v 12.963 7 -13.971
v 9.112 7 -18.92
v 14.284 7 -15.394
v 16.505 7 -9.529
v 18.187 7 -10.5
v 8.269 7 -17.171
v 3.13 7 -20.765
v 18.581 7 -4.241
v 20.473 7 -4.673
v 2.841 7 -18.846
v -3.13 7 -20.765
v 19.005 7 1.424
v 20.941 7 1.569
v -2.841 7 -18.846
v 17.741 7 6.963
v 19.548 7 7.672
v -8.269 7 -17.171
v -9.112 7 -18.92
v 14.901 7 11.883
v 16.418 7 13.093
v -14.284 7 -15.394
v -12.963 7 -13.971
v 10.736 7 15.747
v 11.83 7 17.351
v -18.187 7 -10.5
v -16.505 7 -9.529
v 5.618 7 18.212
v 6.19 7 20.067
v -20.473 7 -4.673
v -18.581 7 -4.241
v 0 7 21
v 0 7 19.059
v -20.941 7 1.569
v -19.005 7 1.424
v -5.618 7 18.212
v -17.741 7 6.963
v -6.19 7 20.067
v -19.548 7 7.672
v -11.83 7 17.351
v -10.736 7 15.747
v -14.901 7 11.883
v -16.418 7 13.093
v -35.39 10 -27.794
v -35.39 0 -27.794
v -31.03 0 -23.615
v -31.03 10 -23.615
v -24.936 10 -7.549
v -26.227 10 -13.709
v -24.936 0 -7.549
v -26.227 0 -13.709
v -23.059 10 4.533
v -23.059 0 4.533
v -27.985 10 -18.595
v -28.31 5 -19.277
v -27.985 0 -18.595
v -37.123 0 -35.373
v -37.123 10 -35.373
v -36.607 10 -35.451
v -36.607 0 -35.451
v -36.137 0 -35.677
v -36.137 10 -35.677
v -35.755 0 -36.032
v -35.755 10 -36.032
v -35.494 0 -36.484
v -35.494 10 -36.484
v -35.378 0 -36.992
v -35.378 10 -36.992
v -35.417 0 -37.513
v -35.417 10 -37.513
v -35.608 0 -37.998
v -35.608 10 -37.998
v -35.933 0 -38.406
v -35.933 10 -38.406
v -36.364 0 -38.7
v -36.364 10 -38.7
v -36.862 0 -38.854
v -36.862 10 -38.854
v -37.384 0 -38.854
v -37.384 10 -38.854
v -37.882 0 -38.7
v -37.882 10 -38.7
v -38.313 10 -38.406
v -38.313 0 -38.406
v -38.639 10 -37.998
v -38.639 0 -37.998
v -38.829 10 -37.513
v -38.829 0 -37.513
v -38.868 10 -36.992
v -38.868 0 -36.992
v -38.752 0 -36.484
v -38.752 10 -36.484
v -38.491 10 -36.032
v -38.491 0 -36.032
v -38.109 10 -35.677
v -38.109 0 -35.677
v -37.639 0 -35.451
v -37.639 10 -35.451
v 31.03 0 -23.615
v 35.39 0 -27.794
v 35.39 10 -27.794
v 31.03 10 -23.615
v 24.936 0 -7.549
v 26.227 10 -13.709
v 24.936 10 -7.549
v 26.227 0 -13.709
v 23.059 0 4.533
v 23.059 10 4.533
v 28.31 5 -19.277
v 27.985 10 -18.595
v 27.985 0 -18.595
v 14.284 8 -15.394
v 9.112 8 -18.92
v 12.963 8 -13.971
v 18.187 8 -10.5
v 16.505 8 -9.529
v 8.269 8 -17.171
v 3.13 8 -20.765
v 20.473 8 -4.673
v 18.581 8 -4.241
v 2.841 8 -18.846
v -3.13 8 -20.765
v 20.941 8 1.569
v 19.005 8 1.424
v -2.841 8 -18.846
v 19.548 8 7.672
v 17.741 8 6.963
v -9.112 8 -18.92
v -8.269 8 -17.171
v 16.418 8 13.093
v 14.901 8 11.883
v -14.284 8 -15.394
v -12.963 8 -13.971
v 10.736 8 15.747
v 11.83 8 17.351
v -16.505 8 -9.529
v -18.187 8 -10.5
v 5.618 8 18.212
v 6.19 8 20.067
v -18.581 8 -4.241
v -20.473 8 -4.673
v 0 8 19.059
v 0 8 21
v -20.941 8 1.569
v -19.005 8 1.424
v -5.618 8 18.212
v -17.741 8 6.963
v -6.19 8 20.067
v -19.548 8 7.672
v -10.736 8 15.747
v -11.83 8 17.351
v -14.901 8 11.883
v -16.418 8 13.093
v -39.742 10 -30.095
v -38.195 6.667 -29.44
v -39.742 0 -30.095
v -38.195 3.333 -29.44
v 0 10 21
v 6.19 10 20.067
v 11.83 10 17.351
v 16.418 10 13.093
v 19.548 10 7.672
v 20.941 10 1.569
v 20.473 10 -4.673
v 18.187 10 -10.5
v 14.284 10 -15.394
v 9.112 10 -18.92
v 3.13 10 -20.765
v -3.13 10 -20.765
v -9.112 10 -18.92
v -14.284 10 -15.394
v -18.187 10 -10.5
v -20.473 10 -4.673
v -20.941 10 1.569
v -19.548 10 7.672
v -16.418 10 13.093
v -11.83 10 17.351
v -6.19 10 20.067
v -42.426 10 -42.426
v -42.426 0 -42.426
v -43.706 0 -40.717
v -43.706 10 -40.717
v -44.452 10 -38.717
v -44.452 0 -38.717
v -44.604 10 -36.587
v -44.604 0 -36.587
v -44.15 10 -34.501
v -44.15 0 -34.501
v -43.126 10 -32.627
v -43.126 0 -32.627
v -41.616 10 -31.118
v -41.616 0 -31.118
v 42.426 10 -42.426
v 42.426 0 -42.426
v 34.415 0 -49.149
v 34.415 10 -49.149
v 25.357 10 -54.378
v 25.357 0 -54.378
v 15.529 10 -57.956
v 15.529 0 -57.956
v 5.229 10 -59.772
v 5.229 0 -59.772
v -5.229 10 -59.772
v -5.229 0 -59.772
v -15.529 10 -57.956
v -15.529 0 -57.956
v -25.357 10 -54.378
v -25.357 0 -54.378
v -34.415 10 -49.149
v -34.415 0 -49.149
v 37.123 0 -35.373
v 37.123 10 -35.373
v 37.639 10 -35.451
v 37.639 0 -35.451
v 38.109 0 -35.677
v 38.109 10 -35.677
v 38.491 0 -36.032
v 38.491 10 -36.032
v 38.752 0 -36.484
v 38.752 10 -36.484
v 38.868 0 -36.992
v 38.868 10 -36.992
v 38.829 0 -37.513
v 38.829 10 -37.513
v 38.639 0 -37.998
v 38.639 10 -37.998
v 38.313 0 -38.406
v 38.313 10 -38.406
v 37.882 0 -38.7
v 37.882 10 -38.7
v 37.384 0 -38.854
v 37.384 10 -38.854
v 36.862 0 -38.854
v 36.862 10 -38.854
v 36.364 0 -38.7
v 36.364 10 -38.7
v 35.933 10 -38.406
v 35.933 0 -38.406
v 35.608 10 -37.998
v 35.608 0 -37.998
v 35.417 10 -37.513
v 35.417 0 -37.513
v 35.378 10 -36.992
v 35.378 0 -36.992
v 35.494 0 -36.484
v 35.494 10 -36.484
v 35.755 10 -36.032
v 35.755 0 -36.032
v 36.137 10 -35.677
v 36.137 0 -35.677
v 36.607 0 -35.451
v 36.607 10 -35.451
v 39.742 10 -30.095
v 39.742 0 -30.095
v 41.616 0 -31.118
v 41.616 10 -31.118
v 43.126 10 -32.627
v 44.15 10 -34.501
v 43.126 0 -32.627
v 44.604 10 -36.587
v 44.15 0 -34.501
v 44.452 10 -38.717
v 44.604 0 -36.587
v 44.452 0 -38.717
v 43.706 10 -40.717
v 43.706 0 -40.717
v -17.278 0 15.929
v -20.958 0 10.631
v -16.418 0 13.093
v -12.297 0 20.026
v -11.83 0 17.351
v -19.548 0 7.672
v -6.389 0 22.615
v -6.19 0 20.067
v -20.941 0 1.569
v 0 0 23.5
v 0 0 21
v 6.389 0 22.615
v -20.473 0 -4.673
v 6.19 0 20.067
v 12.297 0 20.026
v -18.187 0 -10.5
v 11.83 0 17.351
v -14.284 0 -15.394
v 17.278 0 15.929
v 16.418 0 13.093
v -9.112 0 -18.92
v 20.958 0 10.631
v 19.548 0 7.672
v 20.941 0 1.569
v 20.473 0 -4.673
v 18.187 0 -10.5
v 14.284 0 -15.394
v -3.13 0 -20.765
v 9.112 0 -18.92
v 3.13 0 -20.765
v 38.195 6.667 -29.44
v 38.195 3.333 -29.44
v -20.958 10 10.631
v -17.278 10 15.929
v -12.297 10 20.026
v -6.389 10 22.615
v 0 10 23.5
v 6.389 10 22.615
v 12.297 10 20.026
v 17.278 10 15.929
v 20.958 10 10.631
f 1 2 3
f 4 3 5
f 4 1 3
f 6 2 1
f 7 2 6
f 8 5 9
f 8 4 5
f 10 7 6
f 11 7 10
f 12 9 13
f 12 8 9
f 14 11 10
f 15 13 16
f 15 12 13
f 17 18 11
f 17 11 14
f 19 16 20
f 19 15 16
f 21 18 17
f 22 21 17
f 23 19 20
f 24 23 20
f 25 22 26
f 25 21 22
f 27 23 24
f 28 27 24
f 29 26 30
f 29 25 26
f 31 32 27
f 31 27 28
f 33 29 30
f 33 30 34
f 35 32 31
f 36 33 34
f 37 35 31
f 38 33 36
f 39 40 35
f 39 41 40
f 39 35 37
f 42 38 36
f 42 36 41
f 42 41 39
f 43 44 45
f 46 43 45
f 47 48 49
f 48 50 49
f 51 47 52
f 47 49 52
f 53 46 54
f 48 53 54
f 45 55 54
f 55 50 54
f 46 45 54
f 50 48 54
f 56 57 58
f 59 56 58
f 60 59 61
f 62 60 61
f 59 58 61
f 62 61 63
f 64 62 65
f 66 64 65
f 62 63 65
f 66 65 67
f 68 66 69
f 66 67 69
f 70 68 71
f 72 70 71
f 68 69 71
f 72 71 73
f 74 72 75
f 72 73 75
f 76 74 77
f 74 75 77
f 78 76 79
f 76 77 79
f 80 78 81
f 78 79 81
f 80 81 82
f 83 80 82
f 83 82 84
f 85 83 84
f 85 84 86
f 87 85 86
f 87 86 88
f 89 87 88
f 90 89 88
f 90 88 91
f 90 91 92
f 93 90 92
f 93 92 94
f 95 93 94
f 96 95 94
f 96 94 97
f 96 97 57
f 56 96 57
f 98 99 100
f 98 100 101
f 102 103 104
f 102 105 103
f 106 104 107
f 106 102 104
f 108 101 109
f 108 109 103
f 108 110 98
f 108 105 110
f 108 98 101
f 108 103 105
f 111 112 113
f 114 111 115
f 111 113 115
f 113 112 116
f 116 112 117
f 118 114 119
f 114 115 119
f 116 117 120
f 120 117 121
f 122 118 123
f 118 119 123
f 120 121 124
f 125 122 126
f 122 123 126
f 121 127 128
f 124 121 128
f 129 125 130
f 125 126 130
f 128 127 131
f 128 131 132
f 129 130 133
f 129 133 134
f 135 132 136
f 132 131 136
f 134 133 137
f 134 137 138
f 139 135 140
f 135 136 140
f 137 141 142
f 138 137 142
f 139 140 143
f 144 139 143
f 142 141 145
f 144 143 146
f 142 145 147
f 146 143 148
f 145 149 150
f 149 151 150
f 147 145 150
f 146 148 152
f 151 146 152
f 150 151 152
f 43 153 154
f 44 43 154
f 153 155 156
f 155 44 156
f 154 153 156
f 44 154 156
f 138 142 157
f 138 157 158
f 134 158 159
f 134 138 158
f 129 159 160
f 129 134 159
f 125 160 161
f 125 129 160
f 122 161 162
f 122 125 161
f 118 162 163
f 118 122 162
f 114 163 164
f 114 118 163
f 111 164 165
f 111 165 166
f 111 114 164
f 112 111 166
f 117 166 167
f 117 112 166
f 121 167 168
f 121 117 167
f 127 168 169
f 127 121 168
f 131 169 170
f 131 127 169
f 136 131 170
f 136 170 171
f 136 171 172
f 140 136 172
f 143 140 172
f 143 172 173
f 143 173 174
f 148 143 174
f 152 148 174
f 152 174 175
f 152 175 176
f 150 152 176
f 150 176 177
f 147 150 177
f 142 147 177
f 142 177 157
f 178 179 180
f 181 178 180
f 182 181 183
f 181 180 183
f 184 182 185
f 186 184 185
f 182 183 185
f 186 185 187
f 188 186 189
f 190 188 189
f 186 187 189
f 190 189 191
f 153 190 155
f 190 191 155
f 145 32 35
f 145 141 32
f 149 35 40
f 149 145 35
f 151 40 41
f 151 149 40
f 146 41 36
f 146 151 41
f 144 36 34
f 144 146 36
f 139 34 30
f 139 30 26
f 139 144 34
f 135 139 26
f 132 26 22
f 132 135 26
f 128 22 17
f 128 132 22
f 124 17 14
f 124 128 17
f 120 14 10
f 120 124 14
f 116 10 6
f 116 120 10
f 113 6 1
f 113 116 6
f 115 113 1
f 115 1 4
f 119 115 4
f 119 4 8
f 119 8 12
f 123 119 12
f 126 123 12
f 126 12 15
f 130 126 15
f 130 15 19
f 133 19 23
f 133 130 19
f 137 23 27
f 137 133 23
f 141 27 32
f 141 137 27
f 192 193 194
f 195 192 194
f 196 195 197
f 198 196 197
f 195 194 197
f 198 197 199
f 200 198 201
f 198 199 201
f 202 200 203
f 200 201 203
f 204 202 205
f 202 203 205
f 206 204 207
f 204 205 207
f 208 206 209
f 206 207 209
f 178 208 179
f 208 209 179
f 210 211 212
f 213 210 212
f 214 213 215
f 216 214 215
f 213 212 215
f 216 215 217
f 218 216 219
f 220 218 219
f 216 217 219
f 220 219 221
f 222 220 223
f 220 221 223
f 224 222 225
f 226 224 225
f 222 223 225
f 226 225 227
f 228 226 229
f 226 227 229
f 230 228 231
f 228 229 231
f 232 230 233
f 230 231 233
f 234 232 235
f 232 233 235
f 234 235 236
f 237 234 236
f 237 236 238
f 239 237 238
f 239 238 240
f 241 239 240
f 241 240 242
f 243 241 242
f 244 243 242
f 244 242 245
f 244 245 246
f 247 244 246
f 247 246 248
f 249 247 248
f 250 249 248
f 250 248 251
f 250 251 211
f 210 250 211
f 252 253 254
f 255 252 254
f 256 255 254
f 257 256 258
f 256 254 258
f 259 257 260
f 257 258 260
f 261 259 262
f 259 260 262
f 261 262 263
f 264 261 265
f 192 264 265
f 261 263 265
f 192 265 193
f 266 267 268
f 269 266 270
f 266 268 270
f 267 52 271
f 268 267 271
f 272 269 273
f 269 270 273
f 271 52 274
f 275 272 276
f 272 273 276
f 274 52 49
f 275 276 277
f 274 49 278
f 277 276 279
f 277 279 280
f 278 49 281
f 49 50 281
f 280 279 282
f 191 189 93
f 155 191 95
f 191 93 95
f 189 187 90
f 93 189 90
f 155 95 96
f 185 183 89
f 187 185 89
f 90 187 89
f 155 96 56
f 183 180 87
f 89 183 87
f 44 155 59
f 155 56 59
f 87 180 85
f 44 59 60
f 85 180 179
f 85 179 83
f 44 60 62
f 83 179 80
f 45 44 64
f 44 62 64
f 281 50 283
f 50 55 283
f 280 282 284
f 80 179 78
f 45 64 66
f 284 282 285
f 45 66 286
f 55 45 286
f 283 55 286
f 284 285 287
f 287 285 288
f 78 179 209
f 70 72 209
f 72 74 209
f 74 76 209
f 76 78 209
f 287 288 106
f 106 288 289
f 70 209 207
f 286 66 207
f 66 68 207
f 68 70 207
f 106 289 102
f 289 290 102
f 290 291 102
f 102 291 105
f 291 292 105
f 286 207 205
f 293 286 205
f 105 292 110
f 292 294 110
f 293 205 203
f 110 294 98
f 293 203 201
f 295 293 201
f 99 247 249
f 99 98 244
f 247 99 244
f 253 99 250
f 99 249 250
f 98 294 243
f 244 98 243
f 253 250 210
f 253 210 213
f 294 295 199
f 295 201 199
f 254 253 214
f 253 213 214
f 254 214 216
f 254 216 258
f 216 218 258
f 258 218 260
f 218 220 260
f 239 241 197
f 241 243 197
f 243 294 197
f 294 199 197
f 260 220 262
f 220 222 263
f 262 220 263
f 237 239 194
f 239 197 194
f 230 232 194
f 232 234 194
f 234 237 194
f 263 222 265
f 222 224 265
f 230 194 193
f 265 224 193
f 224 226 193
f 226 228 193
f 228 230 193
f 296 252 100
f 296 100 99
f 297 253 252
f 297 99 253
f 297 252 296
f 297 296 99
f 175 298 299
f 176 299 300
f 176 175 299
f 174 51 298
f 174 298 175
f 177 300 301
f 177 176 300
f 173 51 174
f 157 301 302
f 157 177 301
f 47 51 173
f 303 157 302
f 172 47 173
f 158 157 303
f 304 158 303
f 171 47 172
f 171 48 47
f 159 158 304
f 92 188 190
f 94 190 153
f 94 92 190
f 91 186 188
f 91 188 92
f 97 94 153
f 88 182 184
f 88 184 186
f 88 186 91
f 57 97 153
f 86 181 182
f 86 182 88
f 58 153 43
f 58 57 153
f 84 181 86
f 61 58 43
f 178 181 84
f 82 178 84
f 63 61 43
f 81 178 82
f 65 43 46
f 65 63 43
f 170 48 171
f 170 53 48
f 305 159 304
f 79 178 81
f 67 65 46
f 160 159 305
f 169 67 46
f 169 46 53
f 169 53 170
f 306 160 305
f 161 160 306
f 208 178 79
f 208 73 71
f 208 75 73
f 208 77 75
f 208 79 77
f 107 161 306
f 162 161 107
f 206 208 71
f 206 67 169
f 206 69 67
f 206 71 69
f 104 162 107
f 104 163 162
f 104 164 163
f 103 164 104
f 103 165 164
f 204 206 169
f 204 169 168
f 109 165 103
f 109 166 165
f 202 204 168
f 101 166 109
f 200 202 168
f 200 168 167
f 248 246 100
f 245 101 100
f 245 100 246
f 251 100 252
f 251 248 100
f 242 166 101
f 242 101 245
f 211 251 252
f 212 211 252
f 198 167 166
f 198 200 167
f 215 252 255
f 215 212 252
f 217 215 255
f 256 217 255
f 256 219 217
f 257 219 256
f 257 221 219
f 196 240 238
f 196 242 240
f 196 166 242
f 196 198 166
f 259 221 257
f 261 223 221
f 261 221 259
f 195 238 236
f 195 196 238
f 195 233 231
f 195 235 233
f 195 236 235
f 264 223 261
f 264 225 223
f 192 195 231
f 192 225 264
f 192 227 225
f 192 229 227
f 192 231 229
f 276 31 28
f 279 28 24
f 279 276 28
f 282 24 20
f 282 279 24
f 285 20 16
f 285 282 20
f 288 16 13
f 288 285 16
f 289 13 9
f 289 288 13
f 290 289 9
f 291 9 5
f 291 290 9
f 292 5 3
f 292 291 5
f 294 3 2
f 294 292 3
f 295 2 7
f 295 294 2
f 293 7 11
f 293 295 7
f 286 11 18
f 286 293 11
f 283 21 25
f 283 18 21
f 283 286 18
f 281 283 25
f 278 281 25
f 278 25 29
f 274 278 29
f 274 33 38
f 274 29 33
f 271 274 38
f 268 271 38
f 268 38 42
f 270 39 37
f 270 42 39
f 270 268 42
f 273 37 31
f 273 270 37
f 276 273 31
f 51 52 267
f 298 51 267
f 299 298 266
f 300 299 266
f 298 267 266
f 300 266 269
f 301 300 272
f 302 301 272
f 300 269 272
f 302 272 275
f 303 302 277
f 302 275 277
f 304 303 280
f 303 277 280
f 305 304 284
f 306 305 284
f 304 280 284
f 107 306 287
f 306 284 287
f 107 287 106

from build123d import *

# Parameters (mm, degrees)
SKETCH2_R           = 21
BOSS_EXTRUDE1_DEPTH = 10
CUT_EXTRUDE1_REACH  = 77.44
SKETCH3_R           = 1.75
SKETCH5_W           = 4
SKETCH5_H           = 1


with BuildPart() as part:
    # Sketch2 → Boss-Extrude1 (new body)
    # profile 1 of 6: a face of its own
    with BuildSketch(Plane(origin=(0, 0, 0), x_dir=(1, 0, 0), z_dir=(0, 1, 0))):
        with BuildLine():
            ThreePointArc((-39.742001703, 30.095205518), (-35.527778851, 29.794741171), (-31.819805153, 31.819805153))
            Line((-31.819805153, 31.819805153), (-42.426406871, 42.426406871))
            ThreePointArc((-42.426406871, 42.426406871), (-44.451470854, 35.527778851), (-39.742001703, 30.095205518))
        make_face()
    # profile 2 of 6: a face of its own
    with BuildSketch(Plane(origin=(0, 0, 0), x_dir=(1, 0, 0), z_dir=(0, 1, 0))):
        with BuildLine():
            Line((-42.426406871, 42.426406871), (-31.819805153, 31.819805153))
            ThreePointArc((-31.819805153, 31.819805153), (0, 45), (31.819805153, 31.819805153))
            ThreePointArc((31.819805153, 31.819805153), (35.527778851, 29.794741171), (39.742001703, 30.095205518))
            ThreePointArc((39.742001703, 30.095205518), (44.451470854, 35.527778851), (42.426406871, 42.426406871))
            ThreePointArc((42.426406871, 42.426406871), (0, 60), (-42.426406871, 42.426406871))
        make_face()
    # profile 3 of 6: a face of its own
    with BuildSketch(Plane(origin=(0, 0, 0), x_dir=(1, 0, 0), z_dir=(0, 1, 0))):
        with BuildLine():
            ThreePointArc((31.819805153, 31.819805153), (0, 45), (-31.819805153, 31.819805153))
            ThreePointArc((-31.819805153, 31.819805153), (-33.665365801, 29.860394262), (-35.390472848, 27.794143836))
            add(Edge.make_bspline(
                [(-35.390472848, 27.794143836), (-32.245912853, 25.570807212), (-24.806129807, 15.839794796), (-24.750821328, 4.074395815), (-23.058627279, -4.533178579)],
                knots=[0.115209689, 0.115209689, 0.115209689, 0.115209689, 0.392292763, 1, 1, 1, 1], degree=3))
            ThreePointArc((-23.058627279, -4.533178579), (-2.277307506, 23.38939654), (23.5, 0))
            ThreePointArc((23.5, 0), (23.38939654, -2.277307506), (23.058627279, -4.533178579))
            add(Edge.make_bspline(
                [(35.390472848, 27.794143836), (32.245912853, 25.570807212), (24.806129807, 15.839794796), (24.750821328, 4.074395815), (23.058627279, -4.533178579)],
                knots=[0.115209689, 0.115209689, 0.115209689, 0.115209689, 0.392292763, 1, 1, 1, 1], degree=3))
            ThreePointArc((35.390472848, 27.794143836), (33.665365801, 29.860394262), (31.819805153, 31.819805153))
        make_face()
    # profile 4 of 6: a face of its own
    with BuildSketch(Plane(origin=(0, 0, 0), x_dir=(1, 0, 0), z_dir=(0, 1, 0))):
        with BuildLine():
            ThreePointArc((-35.390472848, 27.794143836), (-33.665365801, 29.860394262), (-31.819805153, 31.819805153))
            ThreePointArc((-31.819805153, 31.819805153), (-35.527778851, 29.794741171), (-39.742001703, 30.095205518))
            add(Edge.make_bspline(
                [(-39.742001703, 30.095205518), (-38.146305527, 29.500581015), (-36.697964408, 28.718595549), (-35.390472848, 27.794143836)],
                knots=[0, 0, 0, 0, 0.115209689, 0.115209689, 0.115209689, 0.115209689], degree=3))
        make_face()
    # profile 5 of 6: a face of its own
    with BuildSketch(Plane(origin=(0, 0, 0), x_dir=(1, 0, 0), z_dir=(0, 1, 0))):
        with BuildLine():
            ThreePointArc((39.742001703, 30.095205518), (35.527778851, 29.794741171), (31.819805153, 31.819805153))
            ThreePointArc((31.819805153, 31.819805153), (33.665365801, 29.860394262), (35.390472848, 27.794143836))
            add(Edge.make_bspline(
                [(39.742001703, 30.095205518), (38.146305527, 29.500581015), (36.697964408, 28.718595549), (35.390472848, 27.794143836)],
                knots=[0, 0, 0, 0, 0.115209689, 0.115209689, 0.115209689, 0.115209689], degree=3))
        make_face()
    # profile 6 of 6: a face of its own
    with BuildSketch(Plane(origin=(0, 0, 0), x_dir=(1, 0, 0), z_dir=(0, 1, 0))):
        with BuildLine():
            ThreePointArc((23.5, 0), (-2.277307506, 23.38939654), (-23.058627279, -4.533178579))
            ThreePointArc((-23.058627279, -4.533178579), (0, -23.5), (23.058627279, -4.533178579))
            ThreePointArc((23.058627279, -4.533178579), (23.38939654, -2.277307506), (23.5, 0))
        make_face()
        with Locations(Location((0, 0, 0), (0, 0, 270))):
            Circle(SKETCH2_R, mode=Mode.SUBTRACT)
    extrude(amount=BOSS_EXTRUDE1_DEPTH)

    # Sketch3 → Cut-Extrude1 (cut, up to next)
    with BuildSketch(Plane(origin=(0, 10, 0), x_dir=(1, 0, 0), z_dir=(0, 1, 0)), mode=Mode.PRIVATE) as cut_extrude1_sk1:
        with Locations(Location((-37.123106012, 37.123106012, 0), (0, 0, 270))):
            Circle(SKETCH3_R)
    cut_extrude1_tool1 = extrude(cut_extrude1_sk1.sketch, amount=-CUT_EXTRUDE1_REACH, mode=Mode.PRIVATE) & part.part
    # Sketch3 → Cut-Extrude1 (cut, up to next)
    with BuildSketch(Plane(origin=(0, 10, 0), x_dir=(1, 0, 0), z_dir=(0, 1, 0)), mode=Mode.PRIVATE) as cut_extrude1_sk2:
        with Locations(Location((37.123106012, 37.123106012, 0), (0, 0, 270))):
            Circle(SKETCH3_R)
    cut_extrude1_tool2 = extrude(cut_extrude1_sk2.sketch, amount=-CUT_EXTRUDE1_REACH, mode=Mode.PRIVATE) & part.part
    add(cut_extrude1_tool1.solids().sort_by_distance((-37.123106, 10, -37.123106))[0], mode=Mode.SUBTRACT)
    add(cut_extrude1_tool2.solids().sort_by_distance((37.123106, 10, -37.123106))[0], mode=Mode.SUBTRACT)

    # Sketch5 → Revolve1 (revolve)
    with BuildSketch(Plane.XY, mode=Mode.PRIVATE) as revolve1_sk:
        with Locations((-21.058627279, 7.5)):
            Rectangle(SKETCH5_W, SKETCH5_H)
    revolve(revolve1_sk.sketch.rotate(Axis((0, 10, 0), (0, -1, 0)), 270), axis=Axis((0, 10, 0), (0, -1, 0)))


solid = part.part
